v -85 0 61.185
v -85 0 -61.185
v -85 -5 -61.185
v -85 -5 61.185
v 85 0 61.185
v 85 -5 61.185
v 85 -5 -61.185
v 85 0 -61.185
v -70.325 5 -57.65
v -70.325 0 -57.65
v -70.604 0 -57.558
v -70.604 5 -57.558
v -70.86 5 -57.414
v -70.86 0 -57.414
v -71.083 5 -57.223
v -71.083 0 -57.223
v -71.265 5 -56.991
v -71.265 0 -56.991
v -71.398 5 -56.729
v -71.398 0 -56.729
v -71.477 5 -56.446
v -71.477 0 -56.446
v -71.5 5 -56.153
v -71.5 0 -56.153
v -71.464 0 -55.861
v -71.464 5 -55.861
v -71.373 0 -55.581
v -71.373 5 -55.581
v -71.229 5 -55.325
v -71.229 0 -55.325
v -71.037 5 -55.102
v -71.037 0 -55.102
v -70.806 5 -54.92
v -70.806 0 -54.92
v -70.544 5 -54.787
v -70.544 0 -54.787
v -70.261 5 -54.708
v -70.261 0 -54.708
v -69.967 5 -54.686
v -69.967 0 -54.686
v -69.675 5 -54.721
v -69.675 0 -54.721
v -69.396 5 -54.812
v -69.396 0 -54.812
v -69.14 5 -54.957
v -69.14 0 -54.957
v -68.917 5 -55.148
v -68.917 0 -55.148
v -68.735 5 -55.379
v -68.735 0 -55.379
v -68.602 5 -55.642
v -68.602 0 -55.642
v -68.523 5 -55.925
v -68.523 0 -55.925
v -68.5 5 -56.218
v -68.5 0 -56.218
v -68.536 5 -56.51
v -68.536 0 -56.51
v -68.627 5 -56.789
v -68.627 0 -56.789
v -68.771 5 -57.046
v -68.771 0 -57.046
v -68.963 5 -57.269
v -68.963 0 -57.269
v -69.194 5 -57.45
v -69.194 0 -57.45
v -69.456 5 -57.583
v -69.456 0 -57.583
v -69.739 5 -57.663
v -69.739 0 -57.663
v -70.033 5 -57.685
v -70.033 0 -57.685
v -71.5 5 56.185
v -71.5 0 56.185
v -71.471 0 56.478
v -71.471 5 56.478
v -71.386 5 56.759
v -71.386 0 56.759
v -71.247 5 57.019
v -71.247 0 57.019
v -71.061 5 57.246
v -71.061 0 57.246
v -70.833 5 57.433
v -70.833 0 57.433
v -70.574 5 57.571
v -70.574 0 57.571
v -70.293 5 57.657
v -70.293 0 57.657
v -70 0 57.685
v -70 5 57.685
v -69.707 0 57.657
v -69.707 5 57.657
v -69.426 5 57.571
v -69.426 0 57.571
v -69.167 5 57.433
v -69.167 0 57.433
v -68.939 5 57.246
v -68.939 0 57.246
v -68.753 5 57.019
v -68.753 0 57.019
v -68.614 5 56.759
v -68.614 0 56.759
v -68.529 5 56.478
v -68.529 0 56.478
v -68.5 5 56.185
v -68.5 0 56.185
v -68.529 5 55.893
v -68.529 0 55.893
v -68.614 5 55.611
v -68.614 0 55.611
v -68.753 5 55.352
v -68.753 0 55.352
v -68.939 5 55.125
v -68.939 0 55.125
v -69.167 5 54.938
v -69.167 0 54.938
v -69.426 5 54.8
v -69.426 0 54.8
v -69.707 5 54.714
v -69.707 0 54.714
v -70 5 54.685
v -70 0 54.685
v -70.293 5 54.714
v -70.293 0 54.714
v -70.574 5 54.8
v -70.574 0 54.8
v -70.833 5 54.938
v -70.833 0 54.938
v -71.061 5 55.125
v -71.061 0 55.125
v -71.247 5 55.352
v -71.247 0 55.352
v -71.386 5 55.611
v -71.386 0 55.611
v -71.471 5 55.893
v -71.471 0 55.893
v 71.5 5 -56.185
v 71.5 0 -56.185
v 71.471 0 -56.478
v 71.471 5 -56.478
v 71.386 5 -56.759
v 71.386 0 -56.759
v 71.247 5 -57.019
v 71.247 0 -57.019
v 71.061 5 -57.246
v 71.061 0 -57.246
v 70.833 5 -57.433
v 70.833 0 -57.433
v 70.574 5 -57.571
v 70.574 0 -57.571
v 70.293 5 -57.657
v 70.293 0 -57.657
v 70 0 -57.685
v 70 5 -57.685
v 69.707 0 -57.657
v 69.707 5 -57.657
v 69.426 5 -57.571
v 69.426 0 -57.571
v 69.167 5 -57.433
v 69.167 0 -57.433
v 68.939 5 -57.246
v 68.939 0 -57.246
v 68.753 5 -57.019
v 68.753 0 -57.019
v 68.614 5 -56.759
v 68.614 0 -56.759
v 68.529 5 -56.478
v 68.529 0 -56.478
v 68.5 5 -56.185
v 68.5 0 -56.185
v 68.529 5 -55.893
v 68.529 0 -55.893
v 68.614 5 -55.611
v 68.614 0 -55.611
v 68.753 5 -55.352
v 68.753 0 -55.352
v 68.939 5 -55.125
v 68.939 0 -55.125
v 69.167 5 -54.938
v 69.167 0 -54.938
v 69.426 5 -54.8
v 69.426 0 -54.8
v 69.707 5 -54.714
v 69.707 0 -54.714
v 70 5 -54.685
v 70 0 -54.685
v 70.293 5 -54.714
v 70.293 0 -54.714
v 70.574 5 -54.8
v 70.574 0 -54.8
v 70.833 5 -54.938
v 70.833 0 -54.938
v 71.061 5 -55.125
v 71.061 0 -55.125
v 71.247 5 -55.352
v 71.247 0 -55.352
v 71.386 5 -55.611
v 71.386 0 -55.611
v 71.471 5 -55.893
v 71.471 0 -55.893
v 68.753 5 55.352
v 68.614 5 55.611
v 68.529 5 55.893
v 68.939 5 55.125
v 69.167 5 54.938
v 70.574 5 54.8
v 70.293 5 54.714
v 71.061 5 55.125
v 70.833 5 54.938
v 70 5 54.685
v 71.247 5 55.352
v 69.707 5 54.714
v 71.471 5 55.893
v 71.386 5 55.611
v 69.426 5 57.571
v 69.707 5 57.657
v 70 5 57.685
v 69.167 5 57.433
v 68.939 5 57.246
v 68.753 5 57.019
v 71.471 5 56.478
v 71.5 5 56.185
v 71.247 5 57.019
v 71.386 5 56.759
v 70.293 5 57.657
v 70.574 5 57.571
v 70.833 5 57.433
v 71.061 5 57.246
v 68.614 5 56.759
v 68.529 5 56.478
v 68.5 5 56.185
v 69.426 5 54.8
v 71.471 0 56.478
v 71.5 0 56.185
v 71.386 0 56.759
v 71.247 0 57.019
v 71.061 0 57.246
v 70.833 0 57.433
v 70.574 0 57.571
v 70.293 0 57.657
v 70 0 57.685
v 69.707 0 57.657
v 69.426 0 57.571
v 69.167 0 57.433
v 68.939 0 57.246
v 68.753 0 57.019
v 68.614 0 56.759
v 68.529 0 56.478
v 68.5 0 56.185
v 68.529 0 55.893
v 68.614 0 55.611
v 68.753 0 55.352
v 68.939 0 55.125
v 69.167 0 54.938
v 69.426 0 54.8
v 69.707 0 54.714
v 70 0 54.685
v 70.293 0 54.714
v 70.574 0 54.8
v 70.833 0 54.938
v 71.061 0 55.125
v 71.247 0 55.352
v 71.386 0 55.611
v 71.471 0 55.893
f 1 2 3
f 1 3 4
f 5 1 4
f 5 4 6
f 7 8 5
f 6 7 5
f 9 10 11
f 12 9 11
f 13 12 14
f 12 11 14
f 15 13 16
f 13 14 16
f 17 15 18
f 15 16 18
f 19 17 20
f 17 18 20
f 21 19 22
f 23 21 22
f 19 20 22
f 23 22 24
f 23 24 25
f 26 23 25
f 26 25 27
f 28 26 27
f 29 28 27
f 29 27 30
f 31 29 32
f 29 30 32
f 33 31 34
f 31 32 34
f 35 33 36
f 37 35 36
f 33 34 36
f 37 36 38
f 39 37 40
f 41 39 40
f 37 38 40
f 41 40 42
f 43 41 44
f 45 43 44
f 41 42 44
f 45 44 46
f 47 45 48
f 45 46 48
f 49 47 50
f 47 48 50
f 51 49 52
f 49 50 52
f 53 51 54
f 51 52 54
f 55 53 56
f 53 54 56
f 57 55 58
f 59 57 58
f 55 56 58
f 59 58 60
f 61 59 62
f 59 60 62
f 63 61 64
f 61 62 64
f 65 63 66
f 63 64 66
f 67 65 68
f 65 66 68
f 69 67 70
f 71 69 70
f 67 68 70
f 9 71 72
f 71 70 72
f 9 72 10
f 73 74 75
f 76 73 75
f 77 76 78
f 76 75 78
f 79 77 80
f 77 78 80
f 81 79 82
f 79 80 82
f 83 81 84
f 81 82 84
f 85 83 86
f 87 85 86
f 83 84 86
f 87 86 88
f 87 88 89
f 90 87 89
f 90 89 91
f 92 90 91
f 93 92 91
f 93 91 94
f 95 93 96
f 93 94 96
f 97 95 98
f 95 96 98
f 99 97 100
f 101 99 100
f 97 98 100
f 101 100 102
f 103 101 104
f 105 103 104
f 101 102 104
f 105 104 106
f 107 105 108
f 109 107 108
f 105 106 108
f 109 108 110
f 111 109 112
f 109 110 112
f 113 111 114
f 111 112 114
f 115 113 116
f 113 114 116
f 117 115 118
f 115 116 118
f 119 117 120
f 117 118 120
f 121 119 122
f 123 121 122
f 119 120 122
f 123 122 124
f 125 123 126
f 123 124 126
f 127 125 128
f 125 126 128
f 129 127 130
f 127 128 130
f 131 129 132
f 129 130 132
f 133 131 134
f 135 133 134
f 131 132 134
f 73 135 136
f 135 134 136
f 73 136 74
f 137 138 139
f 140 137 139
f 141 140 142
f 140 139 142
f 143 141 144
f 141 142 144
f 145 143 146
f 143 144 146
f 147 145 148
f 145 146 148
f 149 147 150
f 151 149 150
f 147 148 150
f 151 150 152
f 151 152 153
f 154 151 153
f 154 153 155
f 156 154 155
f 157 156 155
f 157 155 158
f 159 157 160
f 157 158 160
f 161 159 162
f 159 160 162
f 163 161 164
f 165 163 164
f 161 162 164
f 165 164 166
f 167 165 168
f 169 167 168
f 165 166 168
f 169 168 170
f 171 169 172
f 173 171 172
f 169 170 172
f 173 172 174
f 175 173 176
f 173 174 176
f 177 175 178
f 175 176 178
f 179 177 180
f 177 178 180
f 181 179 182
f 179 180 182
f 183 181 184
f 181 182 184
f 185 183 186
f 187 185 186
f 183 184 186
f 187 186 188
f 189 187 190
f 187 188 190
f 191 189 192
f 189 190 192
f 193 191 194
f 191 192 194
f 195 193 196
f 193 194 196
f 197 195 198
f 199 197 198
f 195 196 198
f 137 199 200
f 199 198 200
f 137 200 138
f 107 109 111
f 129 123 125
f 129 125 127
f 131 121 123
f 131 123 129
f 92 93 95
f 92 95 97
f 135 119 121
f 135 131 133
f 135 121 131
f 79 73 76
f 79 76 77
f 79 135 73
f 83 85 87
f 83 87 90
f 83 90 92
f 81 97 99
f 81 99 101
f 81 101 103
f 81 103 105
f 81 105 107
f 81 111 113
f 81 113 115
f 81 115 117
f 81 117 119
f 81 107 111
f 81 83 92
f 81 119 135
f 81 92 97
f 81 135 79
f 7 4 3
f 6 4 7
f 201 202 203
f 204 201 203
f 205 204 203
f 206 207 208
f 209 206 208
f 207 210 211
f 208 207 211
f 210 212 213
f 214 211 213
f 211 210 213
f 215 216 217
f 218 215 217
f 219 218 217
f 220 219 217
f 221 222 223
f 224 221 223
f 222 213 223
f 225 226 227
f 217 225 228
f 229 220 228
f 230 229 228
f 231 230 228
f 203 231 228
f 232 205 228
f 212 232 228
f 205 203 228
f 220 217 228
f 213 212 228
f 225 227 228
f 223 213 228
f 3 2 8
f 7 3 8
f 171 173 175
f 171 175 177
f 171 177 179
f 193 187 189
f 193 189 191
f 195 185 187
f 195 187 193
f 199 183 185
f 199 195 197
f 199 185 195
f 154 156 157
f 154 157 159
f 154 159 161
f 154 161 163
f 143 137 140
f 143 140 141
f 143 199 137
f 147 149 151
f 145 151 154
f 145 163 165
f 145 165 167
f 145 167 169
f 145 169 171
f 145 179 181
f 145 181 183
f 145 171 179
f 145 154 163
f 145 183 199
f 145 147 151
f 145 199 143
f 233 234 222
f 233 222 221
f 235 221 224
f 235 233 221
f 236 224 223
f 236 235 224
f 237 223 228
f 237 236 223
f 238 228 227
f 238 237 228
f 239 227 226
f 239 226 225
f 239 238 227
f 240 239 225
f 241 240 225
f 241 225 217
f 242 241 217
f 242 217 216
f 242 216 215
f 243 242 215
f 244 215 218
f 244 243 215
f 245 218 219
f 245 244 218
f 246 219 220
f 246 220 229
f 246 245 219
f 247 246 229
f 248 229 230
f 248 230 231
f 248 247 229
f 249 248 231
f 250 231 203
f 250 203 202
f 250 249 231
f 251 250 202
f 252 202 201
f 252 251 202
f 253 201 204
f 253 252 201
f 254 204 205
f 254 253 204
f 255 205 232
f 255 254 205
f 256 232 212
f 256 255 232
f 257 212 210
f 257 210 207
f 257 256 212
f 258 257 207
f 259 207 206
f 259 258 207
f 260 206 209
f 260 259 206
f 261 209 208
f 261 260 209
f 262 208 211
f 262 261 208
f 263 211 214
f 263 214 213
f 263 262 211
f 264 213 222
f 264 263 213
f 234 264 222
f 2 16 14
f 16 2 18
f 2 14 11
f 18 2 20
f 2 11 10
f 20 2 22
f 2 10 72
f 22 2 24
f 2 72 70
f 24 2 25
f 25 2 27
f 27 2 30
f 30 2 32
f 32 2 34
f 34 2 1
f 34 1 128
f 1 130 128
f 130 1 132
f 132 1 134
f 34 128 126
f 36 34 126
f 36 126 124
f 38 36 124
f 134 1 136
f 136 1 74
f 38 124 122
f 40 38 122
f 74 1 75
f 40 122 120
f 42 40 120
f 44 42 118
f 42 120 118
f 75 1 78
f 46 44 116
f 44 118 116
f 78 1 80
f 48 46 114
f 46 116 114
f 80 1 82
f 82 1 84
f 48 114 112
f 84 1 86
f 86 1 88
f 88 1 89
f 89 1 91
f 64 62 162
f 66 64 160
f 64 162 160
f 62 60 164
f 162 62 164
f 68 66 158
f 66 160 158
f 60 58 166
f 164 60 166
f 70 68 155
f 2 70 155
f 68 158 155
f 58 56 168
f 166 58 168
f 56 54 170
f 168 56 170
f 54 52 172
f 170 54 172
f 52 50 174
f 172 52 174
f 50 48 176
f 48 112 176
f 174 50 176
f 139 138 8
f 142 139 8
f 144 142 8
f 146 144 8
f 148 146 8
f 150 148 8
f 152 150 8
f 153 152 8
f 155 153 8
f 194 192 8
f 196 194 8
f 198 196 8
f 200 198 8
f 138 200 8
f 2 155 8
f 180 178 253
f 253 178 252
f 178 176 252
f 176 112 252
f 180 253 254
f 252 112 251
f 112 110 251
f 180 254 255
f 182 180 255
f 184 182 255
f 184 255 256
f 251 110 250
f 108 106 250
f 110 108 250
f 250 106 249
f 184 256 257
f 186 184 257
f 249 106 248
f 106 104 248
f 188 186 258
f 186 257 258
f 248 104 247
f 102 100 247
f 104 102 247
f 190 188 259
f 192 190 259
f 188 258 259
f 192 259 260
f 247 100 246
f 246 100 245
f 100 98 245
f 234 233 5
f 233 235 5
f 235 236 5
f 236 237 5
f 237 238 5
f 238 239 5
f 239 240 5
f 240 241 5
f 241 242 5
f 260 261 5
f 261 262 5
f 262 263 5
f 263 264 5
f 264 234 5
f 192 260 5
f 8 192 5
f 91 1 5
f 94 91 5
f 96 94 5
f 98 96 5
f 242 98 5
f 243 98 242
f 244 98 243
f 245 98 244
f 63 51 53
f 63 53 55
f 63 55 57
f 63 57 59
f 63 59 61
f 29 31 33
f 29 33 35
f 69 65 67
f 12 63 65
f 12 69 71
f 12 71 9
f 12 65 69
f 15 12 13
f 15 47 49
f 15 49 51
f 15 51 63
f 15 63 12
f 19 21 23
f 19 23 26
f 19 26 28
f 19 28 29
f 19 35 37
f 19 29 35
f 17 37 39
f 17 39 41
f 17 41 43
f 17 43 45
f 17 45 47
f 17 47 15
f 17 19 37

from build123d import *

# Parameters (mm, degrees)
F0_W     = 170
F0_H     = 122.3707973333
F1_DEPTH = 5
F2_R     = 1.5
F3_DEPTH = 5


# Not quite as in the source:
# - a pattern or mirror of a feature is missing from the dataset's text; its kind, count and spacing are read off the source's solid


with BuildPart() as f1:
    # F0 (on Front) → F1 (new body)
    with BuildSketch(Plane.XZ):
        Rectangle(F0_W, F0_H)
    extrude(amount=F1_DEPTH)

    # F2 (on Front) → F3 (join)
    with BuildSketch(Plane.XZ):
        with Locations((70, 56.1853986666)):
            Circle(F2_R)
    f3 = extrude(amount=-F3_DEPTH)

    # F3_copies: F3 across plane
    add(f3.mirror(Plane(origin=(0, 0, 0), x_dir=(0, 0, -1), z_dir=(-1, 0, 0))))

    # F3_copies1: F3 across plane
    add(f3.mirror(Plane(origin=(0, 0, 0), x_dir=(-1, 0, 0), z_dir=(0, 0, -1))))

    # F3_copies2: F3 across plane
    add(f3.mirror(Plane(origin=(0, 0, 0), x_dir=(0.6259536866, 0, -0.7798602325), z_dir=(-0.7798602325, 0, -0.6259536866))))


solid = f1.part
